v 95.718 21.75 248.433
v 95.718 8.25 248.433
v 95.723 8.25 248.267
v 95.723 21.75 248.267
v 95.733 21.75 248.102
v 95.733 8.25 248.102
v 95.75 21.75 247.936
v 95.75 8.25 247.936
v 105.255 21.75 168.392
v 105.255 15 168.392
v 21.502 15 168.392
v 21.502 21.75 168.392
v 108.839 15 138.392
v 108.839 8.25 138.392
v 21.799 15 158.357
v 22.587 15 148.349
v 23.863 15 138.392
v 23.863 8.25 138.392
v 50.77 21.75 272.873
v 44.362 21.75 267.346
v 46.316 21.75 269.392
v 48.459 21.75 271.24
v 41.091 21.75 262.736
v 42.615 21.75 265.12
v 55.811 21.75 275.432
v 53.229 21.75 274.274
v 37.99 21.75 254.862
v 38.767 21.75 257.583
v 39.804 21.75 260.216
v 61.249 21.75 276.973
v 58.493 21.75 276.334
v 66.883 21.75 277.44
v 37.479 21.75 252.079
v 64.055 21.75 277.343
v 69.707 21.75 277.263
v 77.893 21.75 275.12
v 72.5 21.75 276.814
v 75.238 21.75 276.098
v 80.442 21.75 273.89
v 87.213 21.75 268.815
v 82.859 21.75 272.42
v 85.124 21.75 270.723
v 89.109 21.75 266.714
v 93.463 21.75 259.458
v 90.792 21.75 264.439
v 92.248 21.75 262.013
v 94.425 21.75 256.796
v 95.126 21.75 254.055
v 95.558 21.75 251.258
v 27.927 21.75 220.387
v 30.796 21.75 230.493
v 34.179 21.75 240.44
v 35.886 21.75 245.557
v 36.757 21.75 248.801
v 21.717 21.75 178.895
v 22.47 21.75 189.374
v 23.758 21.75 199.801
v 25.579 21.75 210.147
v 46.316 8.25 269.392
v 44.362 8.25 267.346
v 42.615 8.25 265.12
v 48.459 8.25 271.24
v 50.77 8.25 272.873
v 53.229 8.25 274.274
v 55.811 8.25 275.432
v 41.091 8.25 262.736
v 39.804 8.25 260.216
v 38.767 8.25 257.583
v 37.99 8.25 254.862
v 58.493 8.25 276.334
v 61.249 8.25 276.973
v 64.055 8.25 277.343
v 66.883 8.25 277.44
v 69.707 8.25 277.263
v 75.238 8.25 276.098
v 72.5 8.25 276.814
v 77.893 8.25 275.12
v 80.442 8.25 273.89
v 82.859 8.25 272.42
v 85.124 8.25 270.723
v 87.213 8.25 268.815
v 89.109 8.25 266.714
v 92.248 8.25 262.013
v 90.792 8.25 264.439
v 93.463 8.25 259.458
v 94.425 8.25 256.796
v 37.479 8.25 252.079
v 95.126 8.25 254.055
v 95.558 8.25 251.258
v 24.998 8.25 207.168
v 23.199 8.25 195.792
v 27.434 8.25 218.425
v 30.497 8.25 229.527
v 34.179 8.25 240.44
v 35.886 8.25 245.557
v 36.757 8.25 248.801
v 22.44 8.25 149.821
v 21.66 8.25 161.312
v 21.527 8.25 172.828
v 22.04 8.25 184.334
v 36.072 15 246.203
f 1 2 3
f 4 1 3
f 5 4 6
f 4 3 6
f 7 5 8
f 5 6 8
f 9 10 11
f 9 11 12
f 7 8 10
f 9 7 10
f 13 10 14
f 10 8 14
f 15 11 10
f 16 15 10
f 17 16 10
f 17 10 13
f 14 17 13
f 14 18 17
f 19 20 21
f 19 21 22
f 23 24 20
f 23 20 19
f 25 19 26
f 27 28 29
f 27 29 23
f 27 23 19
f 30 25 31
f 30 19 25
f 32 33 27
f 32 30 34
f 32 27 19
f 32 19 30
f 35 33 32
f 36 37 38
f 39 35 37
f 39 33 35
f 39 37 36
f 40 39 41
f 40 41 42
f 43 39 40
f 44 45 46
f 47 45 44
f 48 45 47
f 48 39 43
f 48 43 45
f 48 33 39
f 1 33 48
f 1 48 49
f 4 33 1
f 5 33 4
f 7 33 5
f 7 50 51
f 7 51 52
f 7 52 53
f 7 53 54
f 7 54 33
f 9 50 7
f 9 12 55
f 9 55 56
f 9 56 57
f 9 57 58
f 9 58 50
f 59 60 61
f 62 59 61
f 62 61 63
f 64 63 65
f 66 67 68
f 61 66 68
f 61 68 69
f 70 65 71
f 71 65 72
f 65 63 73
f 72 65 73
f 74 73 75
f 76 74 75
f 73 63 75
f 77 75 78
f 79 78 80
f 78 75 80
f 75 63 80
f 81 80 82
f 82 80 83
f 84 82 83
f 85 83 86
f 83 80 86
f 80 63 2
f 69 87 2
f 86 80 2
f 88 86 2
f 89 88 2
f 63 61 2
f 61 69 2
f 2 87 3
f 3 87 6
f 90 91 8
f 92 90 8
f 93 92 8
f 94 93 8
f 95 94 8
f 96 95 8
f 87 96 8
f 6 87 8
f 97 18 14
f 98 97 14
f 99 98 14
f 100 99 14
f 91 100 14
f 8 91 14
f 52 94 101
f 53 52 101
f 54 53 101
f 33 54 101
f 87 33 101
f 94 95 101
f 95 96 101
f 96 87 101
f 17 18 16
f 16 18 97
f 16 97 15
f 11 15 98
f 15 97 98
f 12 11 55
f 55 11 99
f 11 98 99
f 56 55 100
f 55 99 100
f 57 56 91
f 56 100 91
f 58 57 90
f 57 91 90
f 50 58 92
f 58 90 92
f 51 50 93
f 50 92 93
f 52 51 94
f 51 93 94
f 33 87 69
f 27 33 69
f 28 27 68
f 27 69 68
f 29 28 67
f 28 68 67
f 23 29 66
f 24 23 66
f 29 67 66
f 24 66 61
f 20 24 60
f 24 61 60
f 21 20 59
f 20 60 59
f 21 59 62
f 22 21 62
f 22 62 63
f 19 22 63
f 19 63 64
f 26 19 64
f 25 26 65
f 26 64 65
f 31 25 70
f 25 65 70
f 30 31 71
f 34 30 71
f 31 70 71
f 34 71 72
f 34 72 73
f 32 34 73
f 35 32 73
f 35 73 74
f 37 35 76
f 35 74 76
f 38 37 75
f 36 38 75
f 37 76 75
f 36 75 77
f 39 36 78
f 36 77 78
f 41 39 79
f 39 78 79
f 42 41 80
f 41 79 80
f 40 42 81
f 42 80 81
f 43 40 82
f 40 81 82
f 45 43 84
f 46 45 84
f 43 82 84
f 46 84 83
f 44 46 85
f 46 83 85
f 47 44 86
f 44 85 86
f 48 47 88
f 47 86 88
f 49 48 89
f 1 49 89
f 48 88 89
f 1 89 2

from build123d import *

# Parameters (mm, degrees)
BOSS_EXTRU_7_DEPTH      = 30
ECHELLE1_SCALE          = 0.45
ESQUISSE2_W             = 105.662811699
ESQUISSE2_H             = 110
ENL_V_MAT_EXTRU_1_DEPTH = 22.7500001
ESQUISSE3_W             = 30
ESQUISSE3_H             = 6.75
ENL_V_MAT_EXTRU_3_DEPTH = 560.216594492


with BuildPart() as part:
    # Esquisse1 → Boss.-Extru.7 (new body)
    with BuildSketch(Plane(origin=(0, 0, 0), x_dir=(1, 0, 0), z_dir=(0, 1, 0))):
        with BuildLine():
            Line((130.068099718, -349.430080583), (176.932850794, 42.776117227))
            ThreePointArc((176.932850794, 42.776117227), (140.21219631, 65.055468432), (104.297030791, 41.49964449))
            ThreePointArc((104.297030791, 41.49964449), (83.352659725, 49.557480865), (63.285053961, 39.513248426))
            ThreePointArc((63.285053961, 39.513248426), (24.333712458, 39.346724586), (0.792917217, 8.313424819))
            add(Edge.make_bspline(
                [(0.792917217, 8.313424819), (-2.209813164, -2.681427076), (-5.40896856, -13.621959217)],
                knots=[0.221662646, 0.221662646, 0.221662646, 1, 1, 1], degree=2))
            ThreePointArc((-5.40896856, -13.621959217), (-34.929657478, -173.074330833), (-6.757332127, -332.770448419))
            add(Edge.make_bspline(
                [(-6.757332127, -332.770448419), (-2.007582254, -345.453681588), (0.57620201, -358.635638513)],
                knots=[0.963730152, 0.963730152, 0.963730152, 1.791334476, 1.791334476, 1.791334476], degree=2))
            ThreePointArc((0.57620201, -358.635638513), (69.060806185, -414.873028703), (129.997803695, -350.534335844))
            ThreePointArc((129.997803695, -350.534335844), (130.017666903, -349.981235195), (130.068099718, -349.430080583))
        make_face()
    extrude(amount=BOSS_EXTRU_7_DEPTH)


with BuildPart() as part_1:
    # Echelle1: scaled about (67.671552852, 15, 164.896156294)
    add(part.part.scale(ECHELLE1_SCALE).moved(Location((37.219354069, 8.25, 90.692885962))))

    # Esquisse2 → Enlèv. mat.-Extru.1 (cut, through all)
    with BuildSketch(Plane(origin=(0, 0, 0), x_dir=(1, 0, 0), z_dir=(0, 1, 0))):
        with Locations((71.147737752, -83.392019497)):
            Rectangle(ESQUISSE2_W, ESQUISSE2_H)
    extrude(amount=ENL_V_MAT_EXTRU_1_DEPTH, mode=Mode.SUBTRACT)

    # Esquisse3 → Enlèv. mat.-Extru.3 (cut, through all)
    with BuildSketch(Plane(origin=(580.715772067, 0, 0), x_dir=(0, 0, -1), z_dir=(1, 0, 0))):
        with Locations((-153.392019497, 18.375)):
            Rectangle(ESQUISSE3_W, ESQUISSE3_H)
    extrude(amount=-ENL_V_MAT_EXTRU_3_DEPTH, mode=Mode.SUBTRACT)


solid = part_1.part
